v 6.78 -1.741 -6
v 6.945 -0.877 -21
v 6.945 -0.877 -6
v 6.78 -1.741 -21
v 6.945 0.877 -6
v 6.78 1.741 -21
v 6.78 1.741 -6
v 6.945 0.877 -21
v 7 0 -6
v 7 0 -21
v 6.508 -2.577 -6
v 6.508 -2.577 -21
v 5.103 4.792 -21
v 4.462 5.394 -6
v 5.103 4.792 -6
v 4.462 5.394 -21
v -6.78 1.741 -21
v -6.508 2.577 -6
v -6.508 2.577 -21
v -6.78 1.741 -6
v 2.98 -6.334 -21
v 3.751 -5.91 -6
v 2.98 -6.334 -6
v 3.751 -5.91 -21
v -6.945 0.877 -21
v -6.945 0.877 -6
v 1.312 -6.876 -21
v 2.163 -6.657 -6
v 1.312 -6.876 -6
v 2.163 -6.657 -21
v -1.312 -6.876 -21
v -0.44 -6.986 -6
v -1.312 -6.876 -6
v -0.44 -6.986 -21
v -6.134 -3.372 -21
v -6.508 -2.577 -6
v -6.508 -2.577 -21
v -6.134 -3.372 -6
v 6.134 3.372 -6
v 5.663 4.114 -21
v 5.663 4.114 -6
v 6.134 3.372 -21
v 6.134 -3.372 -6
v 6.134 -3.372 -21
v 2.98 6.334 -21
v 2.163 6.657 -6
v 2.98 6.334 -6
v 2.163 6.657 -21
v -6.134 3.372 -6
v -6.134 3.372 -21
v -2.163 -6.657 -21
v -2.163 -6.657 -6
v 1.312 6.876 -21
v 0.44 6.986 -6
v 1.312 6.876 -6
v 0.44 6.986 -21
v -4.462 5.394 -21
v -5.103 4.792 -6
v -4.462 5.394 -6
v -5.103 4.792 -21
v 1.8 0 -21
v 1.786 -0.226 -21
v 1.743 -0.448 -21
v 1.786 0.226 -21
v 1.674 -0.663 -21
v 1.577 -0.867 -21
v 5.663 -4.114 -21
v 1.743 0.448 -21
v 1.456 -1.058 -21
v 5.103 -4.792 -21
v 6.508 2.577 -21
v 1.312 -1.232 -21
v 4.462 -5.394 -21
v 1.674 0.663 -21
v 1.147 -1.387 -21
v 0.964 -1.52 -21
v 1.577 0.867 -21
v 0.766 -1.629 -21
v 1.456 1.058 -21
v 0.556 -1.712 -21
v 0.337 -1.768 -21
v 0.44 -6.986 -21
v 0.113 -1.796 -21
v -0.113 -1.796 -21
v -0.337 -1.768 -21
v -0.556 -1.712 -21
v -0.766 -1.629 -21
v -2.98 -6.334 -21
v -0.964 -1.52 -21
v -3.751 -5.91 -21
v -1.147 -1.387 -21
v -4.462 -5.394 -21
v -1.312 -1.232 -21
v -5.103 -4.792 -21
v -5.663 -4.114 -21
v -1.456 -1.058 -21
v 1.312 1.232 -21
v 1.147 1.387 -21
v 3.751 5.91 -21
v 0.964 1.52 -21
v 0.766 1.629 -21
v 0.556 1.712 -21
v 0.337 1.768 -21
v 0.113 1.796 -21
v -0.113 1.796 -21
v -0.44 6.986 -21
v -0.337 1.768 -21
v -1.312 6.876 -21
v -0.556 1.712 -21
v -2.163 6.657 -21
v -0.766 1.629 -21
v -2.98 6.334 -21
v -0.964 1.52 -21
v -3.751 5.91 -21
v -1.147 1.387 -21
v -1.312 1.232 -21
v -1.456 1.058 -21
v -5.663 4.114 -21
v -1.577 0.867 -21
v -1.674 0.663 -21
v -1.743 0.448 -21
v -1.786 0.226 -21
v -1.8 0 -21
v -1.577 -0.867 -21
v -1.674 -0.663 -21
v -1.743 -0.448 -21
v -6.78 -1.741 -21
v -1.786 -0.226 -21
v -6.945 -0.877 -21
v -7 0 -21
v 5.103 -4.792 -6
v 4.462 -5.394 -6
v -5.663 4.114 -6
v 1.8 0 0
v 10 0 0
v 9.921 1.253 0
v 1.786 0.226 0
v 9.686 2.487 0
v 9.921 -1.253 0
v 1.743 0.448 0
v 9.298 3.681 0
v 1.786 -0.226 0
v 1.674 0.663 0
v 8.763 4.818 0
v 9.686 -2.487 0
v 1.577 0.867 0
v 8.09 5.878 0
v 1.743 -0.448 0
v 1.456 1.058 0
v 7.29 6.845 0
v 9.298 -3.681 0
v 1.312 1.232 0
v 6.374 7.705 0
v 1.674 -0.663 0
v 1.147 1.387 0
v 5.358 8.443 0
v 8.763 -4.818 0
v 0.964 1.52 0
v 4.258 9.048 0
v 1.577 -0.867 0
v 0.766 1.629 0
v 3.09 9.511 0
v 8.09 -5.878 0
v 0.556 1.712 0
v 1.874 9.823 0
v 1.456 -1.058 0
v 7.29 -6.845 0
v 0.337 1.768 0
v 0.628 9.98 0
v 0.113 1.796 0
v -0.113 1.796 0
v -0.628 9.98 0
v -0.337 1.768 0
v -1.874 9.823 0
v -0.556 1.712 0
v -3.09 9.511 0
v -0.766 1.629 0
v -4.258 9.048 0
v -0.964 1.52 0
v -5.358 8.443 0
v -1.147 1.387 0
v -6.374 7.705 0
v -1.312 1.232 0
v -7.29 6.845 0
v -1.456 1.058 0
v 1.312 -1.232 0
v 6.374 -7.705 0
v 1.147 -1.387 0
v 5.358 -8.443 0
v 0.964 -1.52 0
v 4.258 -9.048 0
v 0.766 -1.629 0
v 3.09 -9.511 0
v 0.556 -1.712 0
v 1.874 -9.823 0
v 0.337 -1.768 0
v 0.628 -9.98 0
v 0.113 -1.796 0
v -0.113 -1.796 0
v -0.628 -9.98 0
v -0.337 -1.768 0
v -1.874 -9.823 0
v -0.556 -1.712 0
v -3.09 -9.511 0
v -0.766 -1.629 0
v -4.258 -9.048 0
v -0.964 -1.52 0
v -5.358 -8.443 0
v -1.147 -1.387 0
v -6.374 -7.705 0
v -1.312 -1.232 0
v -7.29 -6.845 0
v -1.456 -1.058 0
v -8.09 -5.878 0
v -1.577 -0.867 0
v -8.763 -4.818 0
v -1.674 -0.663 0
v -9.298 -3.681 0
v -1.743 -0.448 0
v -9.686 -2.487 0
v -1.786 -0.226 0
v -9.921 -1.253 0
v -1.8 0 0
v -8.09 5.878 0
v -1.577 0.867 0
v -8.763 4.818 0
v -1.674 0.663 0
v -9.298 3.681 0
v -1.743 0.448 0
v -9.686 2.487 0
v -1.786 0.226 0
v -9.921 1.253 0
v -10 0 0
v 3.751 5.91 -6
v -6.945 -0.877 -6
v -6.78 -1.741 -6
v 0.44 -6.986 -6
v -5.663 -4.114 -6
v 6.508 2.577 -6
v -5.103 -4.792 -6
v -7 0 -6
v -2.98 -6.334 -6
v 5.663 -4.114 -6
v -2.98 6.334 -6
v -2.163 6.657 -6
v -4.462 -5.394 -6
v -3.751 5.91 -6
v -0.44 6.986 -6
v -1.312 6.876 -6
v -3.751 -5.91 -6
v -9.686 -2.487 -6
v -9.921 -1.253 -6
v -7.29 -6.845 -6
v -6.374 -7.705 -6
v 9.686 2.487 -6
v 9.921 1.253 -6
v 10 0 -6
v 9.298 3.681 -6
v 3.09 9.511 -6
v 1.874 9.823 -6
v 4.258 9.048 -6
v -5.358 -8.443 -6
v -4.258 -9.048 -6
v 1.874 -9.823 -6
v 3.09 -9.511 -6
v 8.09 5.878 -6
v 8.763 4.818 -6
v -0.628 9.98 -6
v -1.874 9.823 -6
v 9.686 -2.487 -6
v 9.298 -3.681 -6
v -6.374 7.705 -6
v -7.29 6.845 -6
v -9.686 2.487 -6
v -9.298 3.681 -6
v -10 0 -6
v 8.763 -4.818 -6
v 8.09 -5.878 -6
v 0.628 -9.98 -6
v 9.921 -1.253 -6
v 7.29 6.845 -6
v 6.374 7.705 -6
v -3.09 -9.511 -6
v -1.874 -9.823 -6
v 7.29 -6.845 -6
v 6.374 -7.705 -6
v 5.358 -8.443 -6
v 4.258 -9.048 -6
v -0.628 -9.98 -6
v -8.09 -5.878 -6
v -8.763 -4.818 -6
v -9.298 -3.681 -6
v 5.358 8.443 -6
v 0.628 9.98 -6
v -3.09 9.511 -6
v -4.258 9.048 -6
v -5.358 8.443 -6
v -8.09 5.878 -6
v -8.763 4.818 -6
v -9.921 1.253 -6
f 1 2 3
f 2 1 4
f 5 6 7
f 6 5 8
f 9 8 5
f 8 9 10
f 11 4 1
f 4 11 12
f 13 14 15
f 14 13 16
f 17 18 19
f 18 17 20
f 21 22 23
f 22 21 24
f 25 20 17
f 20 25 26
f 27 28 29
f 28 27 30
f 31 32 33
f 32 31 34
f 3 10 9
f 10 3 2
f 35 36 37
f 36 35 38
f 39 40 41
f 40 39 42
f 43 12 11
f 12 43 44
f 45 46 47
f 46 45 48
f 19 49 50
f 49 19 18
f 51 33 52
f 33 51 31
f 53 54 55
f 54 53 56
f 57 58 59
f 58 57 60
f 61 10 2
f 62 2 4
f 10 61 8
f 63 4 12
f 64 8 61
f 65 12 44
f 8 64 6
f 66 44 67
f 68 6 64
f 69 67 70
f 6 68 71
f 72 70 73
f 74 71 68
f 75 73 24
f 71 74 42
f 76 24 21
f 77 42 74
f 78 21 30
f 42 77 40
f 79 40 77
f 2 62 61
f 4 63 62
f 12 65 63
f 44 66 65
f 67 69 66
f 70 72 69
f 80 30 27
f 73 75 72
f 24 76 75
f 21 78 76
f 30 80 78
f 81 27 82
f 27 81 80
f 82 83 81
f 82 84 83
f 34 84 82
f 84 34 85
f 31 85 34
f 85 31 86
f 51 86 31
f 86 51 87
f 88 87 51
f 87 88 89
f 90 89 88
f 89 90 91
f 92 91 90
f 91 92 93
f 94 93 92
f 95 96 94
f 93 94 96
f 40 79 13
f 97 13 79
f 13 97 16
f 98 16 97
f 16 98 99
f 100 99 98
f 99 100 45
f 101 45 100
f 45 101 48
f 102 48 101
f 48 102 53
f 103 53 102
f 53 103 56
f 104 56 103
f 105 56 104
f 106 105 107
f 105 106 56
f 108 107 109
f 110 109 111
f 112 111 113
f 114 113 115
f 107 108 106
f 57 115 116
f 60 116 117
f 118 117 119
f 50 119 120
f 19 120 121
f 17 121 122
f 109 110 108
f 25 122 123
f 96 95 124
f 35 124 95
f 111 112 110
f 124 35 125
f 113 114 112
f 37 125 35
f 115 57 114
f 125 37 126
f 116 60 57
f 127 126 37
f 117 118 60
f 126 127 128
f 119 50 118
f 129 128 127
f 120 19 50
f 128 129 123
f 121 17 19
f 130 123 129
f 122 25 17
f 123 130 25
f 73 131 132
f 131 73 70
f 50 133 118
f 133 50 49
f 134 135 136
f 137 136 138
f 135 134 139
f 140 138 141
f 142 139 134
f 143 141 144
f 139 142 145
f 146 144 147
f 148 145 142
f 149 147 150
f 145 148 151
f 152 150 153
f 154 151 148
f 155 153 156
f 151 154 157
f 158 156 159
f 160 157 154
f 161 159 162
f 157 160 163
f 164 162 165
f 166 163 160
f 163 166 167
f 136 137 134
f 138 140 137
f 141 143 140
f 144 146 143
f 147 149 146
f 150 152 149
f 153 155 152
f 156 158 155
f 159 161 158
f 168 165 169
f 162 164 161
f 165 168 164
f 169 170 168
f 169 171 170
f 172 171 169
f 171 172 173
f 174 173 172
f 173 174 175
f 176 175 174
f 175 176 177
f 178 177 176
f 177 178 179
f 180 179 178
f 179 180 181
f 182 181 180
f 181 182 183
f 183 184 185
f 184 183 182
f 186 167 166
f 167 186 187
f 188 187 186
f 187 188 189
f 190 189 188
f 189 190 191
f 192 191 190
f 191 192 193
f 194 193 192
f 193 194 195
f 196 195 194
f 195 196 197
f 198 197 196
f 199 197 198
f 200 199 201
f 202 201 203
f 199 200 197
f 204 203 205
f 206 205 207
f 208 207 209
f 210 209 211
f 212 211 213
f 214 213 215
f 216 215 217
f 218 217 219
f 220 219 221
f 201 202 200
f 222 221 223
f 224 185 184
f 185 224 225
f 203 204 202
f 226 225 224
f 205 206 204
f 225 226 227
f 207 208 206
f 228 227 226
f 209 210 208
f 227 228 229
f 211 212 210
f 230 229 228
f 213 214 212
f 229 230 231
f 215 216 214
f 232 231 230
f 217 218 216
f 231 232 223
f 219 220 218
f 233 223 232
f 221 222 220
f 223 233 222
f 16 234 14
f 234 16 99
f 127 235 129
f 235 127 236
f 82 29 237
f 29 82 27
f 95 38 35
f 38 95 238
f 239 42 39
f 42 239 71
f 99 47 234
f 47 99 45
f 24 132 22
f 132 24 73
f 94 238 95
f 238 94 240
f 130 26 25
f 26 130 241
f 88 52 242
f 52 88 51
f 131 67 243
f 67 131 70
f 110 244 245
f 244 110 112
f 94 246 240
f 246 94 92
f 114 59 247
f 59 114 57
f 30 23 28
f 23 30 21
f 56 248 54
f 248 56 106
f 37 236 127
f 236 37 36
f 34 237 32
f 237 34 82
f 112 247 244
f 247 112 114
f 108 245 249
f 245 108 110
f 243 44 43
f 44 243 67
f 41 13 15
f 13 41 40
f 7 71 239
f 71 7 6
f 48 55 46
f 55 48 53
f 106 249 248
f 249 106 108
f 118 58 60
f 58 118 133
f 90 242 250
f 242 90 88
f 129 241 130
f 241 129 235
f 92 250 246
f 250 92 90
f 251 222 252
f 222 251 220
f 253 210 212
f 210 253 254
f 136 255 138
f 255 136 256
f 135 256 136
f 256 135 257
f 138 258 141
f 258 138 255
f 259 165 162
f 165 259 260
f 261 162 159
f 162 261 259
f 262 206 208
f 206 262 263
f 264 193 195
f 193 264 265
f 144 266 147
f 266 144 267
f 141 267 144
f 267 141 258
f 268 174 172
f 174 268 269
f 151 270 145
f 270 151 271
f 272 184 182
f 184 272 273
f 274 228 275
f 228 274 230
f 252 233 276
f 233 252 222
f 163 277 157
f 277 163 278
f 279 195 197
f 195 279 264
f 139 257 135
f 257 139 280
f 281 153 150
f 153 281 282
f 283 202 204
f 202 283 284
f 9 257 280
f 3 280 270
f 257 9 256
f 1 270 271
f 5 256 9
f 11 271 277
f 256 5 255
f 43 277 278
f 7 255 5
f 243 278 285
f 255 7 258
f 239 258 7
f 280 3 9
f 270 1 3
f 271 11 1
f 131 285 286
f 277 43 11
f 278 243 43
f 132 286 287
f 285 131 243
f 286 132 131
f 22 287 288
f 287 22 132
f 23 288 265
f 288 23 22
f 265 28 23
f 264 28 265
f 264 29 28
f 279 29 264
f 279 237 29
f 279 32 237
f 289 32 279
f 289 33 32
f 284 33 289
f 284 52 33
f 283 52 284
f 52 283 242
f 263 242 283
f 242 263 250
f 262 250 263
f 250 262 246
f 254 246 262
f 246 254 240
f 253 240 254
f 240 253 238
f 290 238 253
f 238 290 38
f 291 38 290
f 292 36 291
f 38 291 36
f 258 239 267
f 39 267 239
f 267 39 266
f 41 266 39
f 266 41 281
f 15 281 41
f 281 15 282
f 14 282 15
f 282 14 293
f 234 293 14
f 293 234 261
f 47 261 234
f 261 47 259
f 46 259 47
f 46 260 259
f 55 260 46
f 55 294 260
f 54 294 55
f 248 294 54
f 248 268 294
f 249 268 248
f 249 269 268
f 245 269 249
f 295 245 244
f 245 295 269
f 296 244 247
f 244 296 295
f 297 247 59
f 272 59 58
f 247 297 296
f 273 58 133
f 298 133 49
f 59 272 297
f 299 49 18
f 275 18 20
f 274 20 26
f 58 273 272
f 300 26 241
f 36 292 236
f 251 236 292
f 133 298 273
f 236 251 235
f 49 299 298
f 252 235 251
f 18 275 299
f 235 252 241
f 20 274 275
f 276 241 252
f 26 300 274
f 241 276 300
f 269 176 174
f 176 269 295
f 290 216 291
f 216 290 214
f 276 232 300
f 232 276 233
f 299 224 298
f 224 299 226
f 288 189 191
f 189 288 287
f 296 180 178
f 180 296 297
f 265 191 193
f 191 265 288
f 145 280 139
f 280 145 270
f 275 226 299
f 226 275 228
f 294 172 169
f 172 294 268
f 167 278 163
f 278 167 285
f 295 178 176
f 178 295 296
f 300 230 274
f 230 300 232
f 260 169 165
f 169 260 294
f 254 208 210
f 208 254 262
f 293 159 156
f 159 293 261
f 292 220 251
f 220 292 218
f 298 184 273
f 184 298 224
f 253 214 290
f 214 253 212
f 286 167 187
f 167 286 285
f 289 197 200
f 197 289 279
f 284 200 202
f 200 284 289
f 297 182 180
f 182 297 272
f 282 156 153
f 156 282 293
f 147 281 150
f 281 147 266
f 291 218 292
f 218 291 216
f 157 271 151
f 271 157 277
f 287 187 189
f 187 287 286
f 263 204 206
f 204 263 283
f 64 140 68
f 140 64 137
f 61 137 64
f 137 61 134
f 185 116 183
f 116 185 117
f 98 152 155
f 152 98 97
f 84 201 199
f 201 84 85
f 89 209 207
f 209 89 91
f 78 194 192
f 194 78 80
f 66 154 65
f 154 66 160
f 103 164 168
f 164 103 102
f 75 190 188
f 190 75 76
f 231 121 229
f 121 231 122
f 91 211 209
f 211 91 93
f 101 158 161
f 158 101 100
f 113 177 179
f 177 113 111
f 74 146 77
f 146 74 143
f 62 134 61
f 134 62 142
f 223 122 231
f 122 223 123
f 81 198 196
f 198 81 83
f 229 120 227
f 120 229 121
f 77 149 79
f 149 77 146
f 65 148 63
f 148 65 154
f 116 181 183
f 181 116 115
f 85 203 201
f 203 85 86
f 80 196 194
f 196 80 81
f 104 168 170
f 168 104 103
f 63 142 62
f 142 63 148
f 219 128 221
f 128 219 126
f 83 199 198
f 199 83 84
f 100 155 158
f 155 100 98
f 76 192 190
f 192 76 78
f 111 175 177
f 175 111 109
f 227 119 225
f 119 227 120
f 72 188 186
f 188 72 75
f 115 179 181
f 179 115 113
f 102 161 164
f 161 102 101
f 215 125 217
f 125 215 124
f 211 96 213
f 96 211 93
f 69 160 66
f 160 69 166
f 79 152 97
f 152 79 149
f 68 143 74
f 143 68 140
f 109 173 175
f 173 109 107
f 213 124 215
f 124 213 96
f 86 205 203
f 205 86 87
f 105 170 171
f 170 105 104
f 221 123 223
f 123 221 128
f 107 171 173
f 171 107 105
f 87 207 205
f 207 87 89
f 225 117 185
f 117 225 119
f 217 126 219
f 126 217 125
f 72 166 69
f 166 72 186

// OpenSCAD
$fn = 50;


difference() {
	union() {
		translate(v = [0, 0, -21.0000000000]) {
			cylinder(h = 21, r = 7.0000000000);
		}
		translate(v = [0, 0, -6.0000000000]) {
			cylinder(h = 6, r = 10.0000000000);
		}
	}
	union() {
		#translate(v = [0, 0, -21]) {
			cylinder(h = 21, r = 1.8000000000);
		}
	}
}
